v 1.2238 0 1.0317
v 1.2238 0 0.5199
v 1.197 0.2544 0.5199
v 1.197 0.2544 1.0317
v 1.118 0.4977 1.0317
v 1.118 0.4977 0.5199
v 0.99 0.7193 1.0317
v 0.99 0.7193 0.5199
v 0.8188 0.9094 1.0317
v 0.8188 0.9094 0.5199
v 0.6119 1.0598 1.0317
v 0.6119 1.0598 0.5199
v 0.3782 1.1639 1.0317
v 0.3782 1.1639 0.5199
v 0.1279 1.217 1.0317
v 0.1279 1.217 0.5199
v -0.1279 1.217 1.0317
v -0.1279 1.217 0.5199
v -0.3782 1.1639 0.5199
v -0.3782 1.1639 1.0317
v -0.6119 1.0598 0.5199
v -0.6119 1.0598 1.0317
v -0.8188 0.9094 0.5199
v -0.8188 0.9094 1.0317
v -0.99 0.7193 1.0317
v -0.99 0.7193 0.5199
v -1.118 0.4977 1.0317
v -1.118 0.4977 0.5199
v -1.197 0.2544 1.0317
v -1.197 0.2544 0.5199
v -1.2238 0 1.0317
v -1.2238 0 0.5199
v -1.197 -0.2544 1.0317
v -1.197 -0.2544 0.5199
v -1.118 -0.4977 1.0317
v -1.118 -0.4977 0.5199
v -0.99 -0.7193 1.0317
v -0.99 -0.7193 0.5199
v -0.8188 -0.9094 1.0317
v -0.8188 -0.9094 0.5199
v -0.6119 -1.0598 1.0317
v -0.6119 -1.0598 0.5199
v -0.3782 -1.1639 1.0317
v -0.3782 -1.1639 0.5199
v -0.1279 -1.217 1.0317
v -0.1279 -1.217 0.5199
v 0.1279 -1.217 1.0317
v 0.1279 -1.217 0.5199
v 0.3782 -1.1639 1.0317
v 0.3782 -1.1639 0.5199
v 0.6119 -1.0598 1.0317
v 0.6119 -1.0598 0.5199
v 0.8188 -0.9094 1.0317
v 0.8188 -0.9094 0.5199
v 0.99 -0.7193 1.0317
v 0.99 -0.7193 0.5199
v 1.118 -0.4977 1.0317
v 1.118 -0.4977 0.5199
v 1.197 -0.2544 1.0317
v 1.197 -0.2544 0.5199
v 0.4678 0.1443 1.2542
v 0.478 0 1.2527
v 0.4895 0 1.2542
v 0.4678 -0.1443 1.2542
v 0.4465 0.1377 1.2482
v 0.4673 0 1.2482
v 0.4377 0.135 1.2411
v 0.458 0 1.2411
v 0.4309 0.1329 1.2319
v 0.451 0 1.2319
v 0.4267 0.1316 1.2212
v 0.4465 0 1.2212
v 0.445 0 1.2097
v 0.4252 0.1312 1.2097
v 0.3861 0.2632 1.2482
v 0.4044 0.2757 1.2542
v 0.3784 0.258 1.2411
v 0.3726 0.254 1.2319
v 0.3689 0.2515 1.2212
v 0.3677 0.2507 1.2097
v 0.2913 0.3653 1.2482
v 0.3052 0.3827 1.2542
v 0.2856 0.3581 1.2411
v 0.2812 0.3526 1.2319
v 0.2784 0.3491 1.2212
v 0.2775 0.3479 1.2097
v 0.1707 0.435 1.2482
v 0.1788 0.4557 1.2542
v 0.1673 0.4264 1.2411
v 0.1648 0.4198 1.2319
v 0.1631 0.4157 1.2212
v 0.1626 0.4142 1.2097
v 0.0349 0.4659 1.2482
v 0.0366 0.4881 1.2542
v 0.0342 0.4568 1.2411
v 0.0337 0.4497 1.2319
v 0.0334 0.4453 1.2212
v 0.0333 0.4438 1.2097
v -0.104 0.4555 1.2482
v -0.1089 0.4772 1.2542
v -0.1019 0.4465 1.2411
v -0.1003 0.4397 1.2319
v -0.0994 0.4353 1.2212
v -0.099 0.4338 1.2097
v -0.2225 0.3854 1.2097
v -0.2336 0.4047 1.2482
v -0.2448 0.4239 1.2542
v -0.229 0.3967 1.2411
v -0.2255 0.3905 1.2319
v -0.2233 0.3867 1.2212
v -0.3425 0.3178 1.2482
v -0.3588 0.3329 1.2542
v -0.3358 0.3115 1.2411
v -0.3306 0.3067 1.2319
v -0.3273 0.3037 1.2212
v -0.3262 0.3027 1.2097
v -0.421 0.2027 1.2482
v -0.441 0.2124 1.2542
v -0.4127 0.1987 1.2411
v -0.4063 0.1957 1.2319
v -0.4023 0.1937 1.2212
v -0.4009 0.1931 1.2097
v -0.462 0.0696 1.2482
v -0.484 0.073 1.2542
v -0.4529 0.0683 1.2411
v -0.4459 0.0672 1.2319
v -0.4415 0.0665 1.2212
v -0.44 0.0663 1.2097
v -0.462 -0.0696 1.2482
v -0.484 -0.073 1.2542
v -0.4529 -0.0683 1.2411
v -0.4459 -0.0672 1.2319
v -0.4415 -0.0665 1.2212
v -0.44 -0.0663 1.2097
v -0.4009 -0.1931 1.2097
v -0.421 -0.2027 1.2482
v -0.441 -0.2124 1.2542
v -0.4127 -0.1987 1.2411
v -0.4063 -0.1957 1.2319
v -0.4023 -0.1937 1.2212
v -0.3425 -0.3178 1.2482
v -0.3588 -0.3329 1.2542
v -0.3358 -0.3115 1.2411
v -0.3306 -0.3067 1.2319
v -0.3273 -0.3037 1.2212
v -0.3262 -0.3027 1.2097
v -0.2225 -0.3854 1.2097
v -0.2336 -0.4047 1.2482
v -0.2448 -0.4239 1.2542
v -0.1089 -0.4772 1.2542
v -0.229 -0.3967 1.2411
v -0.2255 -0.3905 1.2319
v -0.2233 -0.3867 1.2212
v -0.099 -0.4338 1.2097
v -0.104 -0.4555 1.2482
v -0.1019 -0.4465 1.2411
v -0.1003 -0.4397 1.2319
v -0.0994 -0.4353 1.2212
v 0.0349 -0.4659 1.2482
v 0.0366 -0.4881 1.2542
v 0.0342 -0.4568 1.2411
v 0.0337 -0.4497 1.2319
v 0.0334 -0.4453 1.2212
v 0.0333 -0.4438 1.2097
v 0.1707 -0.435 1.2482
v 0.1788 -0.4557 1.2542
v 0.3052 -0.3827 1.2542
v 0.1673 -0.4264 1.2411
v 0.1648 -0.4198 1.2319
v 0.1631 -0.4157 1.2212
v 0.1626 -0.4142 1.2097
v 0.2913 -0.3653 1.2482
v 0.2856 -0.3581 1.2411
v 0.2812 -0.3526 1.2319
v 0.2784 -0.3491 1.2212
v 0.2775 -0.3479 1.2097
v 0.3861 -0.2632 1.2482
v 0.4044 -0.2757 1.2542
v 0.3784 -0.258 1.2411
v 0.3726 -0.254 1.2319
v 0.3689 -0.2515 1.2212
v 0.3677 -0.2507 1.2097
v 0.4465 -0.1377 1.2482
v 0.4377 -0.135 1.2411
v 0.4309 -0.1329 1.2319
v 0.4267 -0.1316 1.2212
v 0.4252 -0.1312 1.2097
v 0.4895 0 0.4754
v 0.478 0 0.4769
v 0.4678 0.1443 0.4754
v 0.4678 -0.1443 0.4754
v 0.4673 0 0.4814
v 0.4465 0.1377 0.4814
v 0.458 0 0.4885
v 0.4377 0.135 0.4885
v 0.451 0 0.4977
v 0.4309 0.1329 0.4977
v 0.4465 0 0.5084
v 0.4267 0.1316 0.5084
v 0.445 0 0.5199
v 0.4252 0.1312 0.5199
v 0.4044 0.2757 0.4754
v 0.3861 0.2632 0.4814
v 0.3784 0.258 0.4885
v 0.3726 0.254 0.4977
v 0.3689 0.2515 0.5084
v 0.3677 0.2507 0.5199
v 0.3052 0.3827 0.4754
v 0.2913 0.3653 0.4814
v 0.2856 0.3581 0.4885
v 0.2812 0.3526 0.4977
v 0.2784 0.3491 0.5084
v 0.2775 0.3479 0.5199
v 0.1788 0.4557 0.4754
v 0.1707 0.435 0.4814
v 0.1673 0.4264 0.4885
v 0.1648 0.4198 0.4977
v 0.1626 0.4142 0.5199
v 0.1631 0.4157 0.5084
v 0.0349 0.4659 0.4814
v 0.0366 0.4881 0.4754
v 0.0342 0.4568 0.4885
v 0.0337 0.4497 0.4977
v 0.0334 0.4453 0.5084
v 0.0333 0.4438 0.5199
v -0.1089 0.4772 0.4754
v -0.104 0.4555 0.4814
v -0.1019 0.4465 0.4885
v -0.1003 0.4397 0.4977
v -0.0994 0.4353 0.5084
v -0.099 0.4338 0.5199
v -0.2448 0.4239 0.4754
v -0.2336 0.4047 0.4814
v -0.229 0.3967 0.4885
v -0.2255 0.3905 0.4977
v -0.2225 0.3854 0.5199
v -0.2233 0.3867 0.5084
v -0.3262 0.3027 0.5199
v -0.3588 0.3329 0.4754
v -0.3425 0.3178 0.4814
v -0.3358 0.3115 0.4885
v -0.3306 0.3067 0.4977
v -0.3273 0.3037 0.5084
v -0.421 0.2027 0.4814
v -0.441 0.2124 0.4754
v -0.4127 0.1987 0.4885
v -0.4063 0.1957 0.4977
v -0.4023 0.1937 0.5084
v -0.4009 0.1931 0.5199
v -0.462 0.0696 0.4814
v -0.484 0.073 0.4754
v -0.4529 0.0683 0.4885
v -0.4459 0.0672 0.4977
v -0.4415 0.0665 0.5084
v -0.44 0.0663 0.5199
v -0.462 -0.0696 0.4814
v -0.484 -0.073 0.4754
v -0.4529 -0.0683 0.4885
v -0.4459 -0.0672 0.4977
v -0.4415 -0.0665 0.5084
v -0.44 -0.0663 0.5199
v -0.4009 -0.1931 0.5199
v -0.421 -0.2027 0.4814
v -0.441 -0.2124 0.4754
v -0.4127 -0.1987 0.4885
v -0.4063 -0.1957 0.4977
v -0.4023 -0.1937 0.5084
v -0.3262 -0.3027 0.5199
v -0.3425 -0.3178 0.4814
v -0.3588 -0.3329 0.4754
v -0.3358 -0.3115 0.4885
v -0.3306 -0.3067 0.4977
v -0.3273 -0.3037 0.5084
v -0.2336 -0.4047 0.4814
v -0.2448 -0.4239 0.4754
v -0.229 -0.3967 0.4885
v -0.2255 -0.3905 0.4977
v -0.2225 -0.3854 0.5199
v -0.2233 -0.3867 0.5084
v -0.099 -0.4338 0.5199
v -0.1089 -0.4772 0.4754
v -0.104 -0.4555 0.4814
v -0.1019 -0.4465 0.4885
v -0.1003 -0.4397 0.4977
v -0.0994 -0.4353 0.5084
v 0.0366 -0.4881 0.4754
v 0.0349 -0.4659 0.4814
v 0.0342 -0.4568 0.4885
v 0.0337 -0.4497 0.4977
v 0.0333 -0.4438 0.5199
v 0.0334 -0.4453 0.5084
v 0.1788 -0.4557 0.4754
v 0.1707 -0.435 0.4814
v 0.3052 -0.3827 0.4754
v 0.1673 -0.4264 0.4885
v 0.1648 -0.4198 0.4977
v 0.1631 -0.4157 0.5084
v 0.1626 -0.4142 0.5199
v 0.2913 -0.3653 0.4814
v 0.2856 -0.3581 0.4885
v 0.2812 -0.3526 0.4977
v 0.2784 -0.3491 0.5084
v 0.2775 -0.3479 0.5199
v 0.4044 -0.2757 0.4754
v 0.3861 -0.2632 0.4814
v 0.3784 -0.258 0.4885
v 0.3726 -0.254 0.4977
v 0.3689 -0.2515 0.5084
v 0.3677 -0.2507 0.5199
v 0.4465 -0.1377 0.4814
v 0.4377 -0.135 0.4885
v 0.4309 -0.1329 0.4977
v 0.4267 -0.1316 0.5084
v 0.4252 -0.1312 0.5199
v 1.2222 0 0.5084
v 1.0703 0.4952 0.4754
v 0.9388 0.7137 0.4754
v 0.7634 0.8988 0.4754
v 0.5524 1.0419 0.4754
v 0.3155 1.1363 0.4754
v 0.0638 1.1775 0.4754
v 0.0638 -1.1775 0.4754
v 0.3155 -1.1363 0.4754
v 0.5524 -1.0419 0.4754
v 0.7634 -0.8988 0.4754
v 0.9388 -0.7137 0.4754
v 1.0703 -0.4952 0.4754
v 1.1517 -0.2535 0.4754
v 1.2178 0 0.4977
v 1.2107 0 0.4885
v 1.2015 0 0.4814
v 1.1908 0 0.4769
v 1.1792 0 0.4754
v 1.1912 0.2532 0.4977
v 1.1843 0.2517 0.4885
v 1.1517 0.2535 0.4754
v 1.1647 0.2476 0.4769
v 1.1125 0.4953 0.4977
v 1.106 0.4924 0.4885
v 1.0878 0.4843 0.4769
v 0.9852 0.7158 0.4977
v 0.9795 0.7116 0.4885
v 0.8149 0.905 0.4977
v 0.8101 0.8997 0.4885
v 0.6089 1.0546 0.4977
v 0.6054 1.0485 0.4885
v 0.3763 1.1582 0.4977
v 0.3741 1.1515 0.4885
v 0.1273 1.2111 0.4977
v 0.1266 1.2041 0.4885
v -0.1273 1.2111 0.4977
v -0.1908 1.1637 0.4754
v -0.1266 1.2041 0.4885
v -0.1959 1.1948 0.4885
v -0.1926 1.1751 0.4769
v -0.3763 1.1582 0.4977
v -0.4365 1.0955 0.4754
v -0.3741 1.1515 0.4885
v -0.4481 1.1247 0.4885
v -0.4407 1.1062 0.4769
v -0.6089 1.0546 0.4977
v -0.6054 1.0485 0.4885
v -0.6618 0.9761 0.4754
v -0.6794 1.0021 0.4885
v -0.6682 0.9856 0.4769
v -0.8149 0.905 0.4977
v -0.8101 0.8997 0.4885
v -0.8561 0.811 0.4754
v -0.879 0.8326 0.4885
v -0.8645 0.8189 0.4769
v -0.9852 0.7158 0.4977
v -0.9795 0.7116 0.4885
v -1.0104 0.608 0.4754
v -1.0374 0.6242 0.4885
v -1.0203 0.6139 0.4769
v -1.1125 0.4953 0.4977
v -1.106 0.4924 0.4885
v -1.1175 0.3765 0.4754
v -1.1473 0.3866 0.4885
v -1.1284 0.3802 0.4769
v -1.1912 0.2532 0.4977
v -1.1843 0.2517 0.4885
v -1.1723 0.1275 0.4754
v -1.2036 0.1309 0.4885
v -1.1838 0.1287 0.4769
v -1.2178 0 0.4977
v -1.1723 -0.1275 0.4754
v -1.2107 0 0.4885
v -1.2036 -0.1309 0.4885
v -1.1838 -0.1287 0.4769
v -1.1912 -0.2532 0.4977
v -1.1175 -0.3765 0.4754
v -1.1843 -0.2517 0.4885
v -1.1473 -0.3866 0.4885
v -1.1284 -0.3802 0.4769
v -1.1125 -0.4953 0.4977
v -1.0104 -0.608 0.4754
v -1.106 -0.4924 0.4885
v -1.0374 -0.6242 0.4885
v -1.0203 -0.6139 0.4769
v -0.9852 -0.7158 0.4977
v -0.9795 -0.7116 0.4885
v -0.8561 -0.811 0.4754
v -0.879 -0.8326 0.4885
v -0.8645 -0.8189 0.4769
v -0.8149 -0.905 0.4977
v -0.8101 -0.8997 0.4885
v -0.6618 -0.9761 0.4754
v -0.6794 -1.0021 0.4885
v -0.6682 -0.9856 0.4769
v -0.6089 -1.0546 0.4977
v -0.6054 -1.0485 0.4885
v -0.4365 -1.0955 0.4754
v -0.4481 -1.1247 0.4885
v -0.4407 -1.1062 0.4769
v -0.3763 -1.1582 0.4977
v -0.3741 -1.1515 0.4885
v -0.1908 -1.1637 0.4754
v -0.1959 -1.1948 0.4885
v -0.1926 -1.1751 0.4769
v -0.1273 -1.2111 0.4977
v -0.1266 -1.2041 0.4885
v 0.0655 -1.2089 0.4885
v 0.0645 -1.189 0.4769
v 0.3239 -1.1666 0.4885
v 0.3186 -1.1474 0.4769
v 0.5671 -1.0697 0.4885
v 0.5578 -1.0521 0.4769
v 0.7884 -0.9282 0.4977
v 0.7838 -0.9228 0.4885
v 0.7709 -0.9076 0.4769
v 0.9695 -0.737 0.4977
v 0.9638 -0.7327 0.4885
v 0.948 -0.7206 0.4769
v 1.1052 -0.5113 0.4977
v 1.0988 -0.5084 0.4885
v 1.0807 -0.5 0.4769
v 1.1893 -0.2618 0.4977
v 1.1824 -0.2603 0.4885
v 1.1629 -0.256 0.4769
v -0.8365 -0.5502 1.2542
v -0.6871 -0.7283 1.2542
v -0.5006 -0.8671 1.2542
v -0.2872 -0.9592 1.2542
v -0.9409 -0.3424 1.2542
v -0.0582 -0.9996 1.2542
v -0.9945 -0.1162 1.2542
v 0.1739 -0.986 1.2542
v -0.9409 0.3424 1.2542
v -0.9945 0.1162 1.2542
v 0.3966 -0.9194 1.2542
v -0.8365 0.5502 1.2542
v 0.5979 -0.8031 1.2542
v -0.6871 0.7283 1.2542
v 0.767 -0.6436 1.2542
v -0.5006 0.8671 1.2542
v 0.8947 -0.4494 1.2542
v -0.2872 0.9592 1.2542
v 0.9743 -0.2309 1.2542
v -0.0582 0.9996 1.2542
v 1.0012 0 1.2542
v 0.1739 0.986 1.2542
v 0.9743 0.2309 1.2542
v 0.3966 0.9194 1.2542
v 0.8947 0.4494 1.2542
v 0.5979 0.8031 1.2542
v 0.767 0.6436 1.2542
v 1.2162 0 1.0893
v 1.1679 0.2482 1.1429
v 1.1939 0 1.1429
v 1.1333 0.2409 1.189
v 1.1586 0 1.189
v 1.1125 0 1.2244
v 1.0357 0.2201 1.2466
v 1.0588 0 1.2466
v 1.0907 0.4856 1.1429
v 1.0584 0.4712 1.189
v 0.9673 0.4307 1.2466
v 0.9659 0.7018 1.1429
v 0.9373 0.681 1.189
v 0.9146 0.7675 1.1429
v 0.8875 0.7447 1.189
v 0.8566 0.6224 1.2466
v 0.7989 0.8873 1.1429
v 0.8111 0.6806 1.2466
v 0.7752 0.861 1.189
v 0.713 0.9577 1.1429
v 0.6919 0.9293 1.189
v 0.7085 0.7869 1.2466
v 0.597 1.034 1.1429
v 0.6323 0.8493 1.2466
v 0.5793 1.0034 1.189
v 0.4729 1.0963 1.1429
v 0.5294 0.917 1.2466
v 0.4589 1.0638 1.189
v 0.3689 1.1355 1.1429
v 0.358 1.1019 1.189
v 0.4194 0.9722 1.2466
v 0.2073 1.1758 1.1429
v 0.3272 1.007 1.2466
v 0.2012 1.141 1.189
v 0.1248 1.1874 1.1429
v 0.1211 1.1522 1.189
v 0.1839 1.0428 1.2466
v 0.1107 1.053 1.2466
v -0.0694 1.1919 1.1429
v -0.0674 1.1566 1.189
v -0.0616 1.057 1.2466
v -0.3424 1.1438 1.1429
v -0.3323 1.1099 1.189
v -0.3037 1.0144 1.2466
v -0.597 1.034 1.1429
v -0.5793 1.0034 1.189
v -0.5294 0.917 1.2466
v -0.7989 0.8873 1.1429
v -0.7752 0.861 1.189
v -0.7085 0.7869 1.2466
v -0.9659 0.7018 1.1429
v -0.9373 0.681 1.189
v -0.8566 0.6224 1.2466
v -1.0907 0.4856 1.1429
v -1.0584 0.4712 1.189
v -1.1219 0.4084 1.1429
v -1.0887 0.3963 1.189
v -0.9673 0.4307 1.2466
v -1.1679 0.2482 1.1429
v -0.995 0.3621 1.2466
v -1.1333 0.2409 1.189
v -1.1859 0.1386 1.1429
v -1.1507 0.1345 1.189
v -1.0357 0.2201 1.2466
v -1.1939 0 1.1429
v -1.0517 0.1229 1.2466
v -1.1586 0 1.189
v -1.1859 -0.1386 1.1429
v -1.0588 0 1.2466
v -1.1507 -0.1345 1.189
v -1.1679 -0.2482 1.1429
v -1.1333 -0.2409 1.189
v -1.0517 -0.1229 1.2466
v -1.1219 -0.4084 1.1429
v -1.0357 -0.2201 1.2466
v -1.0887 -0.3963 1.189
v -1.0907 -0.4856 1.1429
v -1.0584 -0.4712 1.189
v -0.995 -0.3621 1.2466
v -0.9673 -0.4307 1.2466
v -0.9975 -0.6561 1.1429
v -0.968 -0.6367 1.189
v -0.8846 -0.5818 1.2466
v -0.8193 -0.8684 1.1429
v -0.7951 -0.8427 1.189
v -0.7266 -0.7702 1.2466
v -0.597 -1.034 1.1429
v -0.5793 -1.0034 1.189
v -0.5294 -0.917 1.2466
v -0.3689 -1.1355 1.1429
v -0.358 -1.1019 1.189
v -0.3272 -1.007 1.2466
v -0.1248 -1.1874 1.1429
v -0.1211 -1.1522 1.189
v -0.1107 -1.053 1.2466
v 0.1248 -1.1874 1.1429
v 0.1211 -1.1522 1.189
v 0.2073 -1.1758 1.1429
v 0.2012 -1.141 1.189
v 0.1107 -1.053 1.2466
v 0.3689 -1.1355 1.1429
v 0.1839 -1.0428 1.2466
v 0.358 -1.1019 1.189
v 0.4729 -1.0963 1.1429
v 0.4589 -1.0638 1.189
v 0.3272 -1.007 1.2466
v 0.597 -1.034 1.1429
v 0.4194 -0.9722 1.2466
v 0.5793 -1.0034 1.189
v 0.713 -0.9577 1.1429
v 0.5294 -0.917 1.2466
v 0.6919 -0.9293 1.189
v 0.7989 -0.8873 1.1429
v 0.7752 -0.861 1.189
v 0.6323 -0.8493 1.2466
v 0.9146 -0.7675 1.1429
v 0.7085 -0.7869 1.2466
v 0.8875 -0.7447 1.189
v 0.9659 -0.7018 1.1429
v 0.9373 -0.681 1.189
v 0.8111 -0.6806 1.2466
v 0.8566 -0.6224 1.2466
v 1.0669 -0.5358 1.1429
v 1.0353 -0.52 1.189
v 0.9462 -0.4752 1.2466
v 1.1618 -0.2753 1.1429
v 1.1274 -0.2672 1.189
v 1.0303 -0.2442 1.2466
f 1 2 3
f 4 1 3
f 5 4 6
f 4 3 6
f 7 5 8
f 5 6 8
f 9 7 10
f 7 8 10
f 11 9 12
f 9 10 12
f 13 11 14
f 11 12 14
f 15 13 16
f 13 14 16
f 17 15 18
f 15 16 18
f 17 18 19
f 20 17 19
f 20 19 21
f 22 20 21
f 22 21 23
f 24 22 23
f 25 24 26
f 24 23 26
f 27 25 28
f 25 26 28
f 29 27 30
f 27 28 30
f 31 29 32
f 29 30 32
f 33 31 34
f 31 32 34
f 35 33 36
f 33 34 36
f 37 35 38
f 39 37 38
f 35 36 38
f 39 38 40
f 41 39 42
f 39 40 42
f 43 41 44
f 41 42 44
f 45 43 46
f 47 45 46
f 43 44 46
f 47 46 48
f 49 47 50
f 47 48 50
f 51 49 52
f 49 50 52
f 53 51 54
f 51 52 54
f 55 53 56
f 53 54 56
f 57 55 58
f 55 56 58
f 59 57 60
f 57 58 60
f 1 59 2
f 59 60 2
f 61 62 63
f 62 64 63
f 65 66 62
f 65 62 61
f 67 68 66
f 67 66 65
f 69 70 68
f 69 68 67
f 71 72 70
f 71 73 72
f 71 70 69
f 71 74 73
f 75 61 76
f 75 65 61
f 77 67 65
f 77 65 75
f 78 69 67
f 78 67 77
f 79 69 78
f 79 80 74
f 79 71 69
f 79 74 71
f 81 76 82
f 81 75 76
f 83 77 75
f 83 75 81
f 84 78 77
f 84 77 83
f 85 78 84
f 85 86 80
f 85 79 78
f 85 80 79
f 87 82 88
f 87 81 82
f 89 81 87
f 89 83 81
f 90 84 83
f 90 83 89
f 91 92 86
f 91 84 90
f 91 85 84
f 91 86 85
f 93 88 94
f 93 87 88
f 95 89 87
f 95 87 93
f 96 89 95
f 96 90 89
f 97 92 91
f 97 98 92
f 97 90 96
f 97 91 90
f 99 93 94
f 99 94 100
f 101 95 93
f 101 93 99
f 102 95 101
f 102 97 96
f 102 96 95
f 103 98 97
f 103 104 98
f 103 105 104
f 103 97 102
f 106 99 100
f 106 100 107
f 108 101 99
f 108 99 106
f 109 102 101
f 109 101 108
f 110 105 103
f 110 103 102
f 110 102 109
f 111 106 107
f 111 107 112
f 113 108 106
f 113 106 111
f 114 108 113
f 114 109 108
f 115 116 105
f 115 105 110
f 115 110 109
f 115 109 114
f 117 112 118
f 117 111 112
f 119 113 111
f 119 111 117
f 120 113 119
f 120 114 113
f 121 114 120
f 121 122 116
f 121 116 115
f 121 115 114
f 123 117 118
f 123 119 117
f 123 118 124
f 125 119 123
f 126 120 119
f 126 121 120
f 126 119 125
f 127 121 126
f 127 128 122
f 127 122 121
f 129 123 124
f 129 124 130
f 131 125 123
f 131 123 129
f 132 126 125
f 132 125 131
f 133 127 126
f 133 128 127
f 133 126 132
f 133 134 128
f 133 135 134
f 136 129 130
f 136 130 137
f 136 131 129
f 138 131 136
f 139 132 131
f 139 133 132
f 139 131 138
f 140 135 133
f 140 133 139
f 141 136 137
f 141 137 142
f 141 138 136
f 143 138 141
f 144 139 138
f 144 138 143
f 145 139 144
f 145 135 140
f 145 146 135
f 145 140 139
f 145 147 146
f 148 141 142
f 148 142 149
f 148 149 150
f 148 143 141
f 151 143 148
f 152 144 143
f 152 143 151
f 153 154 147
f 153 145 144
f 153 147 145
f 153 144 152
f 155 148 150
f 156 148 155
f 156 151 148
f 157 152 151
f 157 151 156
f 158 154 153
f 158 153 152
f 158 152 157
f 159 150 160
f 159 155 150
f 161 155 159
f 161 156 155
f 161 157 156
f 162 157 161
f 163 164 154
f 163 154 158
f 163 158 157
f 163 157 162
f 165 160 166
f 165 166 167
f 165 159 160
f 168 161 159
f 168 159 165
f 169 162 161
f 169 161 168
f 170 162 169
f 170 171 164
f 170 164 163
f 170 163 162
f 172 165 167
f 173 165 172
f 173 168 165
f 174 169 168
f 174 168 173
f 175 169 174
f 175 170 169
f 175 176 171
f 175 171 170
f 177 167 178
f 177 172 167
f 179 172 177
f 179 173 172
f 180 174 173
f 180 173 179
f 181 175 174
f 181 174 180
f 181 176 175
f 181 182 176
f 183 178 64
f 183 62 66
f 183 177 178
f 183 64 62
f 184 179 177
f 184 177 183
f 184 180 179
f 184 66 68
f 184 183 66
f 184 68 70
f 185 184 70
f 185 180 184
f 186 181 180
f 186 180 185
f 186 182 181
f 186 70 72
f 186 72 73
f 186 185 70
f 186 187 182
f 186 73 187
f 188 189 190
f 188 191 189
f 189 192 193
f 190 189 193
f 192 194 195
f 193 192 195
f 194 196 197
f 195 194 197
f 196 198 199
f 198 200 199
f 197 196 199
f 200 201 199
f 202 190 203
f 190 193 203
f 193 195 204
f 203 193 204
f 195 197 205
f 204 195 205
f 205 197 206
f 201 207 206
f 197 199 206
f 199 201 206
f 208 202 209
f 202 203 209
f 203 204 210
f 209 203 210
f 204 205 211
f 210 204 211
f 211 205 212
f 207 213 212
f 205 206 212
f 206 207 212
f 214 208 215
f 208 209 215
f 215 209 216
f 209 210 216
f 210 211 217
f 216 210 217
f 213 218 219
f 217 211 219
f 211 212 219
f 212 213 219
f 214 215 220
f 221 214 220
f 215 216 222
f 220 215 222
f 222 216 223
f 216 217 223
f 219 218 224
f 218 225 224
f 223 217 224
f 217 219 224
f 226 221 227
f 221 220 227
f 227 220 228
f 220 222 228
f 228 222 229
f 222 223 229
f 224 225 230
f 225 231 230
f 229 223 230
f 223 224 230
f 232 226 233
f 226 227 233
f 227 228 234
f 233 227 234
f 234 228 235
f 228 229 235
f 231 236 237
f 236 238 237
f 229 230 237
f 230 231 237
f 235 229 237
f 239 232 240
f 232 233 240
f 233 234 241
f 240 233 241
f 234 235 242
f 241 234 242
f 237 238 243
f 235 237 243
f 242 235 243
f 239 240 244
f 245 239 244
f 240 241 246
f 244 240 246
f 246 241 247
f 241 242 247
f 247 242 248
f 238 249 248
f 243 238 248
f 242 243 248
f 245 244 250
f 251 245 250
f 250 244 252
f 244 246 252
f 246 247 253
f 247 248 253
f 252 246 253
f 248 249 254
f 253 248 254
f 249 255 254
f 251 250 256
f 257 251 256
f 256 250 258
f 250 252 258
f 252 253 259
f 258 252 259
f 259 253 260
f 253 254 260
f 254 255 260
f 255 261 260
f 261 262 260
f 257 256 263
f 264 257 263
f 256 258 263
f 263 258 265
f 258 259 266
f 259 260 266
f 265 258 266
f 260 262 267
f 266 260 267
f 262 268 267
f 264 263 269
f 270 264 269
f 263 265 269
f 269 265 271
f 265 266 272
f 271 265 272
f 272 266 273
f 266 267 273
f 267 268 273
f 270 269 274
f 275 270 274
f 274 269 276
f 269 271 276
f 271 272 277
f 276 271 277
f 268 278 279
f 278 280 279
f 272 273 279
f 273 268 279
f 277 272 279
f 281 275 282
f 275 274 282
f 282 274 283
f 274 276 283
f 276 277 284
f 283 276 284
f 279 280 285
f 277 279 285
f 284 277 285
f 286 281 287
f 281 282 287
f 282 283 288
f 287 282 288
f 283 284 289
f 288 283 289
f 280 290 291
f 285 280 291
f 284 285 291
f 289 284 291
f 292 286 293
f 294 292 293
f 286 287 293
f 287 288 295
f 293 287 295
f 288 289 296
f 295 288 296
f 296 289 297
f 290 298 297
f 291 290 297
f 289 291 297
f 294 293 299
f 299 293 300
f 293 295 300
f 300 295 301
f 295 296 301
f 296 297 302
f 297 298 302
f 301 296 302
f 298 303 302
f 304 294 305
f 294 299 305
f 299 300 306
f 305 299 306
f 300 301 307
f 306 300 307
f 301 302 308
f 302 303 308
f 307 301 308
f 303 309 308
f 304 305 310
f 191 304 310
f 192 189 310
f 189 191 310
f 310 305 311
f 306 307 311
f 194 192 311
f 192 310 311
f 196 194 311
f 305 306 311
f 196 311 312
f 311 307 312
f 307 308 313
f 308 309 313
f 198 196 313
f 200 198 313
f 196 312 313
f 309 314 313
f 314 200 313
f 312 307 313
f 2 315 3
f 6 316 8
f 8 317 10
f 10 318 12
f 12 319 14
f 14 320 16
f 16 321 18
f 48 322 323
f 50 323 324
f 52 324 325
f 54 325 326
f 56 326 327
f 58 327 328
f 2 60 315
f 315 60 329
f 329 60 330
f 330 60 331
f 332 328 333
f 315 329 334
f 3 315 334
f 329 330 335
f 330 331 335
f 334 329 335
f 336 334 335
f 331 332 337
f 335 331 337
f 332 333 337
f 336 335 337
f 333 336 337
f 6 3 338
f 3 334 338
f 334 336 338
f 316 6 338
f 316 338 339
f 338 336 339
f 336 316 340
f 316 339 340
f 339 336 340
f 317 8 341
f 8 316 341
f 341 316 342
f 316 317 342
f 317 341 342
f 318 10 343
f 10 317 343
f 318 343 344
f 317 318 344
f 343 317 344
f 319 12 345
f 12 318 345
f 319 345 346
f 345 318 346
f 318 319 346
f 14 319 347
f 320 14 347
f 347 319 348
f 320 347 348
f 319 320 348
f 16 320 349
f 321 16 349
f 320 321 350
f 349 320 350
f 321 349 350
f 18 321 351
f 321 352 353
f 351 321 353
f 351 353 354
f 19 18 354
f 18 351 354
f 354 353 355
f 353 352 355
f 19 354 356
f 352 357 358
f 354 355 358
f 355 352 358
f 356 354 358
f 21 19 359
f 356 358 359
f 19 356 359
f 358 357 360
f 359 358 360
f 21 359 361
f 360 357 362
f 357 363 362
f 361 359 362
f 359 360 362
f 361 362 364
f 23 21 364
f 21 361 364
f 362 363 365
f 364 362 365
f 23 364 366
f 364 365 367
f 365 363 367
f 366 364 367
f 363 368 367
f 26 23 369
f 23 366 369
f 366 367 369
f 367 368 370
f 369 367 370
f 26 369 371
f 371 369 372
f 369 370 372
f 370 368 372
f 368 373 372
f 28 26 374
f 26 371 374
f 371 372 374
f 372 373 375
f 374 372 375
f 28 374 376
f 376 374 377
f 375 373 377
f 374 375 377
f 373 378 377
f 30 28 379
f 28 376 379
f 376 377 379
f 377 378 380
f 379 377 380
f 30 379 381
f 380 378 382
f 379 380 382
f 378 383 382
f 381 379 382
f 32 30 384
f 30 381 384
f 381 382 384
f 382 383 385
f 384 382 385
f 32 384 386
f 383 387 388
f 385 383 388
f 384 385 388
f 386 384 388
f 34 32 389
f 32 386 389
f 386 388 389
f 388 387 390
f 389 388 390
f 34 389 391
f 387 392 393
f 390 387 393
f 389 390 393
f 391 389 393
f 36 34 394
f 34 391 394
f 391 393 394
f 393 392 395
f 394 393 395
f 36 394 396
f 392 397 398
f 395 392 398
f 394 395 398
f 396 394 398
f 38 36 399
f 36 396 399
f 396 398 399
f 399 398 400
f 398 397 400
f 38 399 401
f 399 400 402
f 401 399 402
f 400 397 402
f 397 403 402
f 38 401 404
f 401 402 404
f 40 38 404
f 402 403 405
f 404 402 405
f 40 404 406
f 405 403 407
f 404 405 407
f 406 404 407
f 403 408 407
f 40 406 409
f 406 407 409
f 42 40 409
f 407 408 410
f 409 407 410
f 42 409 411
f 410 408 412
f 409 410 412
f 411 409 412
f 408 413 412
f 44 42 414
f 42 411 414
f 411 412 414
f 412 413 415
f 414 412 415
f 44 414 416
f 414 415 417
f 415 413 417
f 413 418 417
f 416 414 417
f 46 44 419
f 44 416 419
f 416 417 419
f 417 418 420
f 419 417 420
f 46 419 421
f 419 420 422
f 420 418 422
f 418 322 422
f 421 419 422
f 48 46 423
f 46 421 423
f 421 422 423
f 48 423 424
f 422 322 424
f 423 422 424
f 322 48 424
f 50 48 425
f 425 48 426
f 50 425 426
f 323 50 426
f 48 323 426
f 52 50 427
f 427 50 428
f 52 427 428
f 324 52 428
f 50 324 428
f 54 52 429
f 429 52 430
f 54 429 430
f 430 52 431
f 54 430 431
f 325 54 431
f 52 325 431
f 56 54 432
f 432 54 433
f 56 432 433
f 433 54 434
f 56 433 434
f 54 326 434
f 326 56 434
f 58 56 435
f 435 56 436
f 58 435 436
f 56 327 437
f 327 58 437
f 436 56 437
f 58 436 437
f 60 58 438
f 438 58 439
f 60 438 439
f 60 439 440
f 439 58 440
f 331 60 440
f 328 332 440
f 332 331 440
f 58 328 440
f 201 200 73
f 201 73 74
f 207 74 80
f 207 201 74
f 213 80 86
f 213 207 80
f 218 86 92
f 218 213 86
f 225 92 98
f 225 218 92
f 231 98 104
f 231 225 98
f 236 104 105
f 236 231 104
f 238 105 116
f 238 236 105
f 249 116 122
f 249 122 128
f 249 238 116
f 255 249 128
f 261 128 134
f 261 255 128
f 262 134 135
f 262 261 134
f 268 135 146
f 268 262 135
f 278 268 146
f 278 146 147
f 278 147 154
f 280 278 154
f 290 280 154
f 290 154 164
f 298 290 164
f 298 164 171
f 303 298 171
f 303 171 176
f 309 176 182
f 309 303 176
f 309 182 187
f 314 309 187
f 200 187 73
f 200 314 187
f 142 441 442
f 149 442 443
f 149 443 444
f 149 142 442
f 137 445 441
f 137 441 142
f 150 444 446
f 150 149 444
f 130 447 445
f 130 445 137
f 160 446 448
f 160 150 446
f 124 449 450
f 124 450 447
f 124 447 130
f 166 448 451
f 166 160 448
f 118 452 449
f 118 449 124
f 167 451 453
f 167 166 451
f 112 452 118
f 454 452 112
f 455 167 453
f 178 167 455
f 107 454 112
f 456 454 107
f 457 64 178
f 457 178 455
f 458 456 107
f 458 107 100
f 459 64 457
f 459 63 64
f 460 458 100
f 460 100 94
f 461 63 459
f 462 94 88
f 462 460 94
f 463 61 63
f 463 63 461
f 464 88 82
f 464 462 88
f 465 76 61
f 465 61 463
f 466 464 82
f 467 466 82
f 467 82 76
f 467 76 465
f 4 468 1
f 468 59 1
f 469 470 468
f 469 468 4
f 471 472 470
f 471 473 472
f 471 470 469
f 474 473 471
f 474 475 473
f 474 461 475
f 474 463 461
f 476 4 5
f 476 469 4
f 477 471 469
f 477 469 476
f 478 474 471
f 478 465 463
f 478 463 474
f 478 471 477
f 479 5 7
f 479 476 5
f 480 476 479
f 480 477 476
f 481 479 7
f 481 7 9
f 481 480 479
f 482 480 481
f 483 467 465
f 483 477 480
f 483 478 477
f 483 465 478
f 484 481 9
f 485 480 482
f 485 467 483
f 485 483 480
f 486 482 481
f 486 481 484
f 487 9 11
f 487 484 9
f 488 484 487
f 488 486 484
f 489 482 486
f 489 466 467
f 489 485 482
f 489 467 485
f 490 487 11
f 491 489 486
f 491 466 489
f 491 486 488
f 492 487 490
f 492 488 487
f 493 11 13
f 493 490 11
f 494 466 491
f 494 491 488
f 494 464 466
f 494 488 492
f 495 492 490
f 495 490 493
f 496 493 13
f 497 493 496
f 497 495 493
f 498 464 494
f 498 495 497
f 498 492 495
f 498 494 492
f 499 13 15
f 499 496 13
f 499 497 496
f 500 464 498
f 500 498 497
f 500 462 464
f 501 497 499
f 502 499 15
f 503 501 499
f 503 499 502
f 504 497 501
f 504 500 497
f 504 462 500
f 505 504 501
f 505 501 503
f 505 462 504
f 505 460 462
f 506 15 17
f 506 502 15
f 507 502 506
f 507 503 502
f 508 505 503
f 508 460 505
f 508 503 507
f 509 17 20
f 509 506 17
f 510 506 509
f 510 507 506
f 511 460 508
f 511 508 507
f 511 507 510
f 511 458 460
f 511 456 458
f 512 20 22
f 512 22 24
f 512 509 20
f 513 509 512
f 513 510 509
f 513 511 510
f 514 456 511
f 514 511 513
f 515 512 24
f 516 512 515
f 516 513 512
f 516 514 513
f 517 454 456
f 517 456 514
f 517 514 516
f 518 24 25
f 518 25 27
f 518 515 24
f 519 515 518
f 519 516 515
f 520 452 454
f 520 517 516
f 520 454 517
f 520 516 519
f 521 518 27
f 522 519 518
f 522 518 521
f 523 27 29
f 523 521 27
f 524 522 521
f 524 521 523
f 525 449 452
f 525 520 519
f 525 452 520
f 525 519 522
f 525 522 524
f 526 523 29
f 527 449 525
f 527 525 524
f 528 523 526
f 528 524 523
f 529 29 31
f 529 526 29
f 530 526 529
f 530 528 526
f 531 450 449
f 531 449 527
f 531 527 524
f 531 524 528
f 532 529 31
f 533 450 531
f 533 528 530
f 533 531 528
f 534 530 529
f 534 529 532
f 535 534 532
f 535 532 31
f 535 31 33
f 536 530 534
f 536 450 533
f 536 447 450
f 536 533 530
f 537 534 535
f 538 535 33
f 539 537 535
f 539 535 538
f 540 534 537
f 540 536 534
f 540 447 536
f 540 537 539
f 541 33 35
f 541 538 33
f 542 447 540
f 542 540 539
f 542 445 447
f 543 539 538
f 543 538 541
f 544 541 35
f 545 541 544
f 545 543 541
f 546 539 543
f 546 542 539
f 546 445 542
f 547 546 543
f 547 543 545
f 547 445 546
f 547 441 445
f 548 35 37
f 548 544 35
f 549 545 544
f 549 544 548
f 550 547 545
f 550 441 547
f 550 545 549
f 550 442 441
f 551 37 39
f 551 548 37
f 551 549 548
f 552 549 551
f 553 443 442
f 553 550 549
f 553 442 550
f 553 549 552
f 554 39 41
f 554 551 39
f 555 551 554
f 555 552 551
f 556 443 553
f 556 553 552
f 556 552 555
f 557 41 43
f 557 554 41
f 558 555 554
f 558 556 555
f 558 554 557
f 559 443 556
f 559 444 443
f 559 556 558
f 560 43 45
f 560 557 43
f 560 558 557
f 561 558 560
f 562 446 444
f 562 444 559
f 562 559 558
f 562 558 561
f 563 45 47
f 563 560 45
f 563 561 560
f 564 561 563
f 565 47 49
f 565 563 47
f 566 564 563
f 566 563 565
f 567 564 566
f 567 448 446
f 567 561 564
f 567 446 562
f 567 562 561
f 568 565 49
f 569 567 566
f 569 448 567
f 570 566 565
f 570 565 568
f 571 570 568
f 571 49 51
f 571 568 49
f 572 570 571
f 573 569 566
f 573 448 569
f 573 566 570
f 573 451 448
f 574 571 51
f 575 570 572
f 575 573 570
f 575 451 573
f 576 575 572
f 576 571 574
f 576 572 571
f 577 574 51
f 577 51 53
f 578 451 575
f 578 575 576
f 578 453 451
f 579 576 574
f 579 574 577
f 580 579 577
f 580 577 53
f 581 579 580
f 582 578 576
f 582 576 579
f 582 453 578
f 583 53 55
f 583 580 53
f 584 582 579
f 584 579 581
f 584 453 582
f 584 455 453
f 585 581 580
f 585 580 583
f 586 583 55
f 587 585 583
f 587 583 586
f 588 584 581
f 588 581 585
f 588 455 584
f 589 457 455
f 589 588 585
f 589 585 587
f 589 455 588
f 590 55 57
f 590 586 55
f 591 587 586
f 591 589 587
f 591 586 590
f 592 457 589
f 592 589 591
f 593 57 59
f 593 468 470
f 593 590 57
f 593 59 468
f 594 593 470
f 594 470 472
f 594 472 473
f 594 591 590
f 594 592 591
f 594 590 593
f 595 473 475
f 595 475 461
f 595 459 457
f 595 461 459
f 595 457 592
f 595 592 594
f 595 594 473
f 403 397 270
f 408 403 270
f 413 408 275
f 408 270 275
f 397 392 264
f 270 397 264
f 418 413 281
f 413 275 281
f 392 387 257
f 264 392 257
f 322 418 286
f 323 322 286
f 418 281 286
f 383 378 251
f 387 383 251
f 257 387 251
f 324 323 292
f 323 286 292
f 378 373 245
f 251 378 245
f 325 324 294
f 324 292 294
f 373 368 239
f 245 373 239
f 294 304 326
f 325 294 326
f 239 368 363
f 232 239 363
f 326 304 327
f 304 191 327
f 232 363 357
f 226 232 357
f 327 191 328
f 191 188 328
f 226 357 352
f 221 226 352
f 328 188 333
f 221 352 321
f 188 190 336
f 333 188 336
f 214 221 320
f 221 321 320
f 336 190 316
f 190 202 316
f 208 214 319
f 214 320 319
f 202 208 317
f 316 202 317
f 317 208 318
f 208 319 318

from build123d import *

# Parameters (mm, degrees)
SKETCH1_R           = 2.75
SKETCH1_R_2         = 1
EXTRUDE_THIN1_DEPTH = 1.75
FILLET1_R           = 0.5
FILLET2_R           = 0.1
SCALE1_SCALE        = 0.445


with BuildPart() as part:
    # Sketch1 → Extrude-Thin1 (new body)
    with BuildSketch(Plane.XY):
        Circle(SKETCH1_R)
        Circle(SKETCH1_R_2, mode=Mode.SUBTRACT)
    extrude(amount=EXTRUDE_THIN1_DEPTH)

    # Fillet1
    fillet1_edges = [part.edges().sort_by_distance(p)[0] for p in [
        (-2.75, 0, 1.75),
    ]]
    fillet(fillet1_edges, radius=FILLET1_R)

    # Fillet2
    fillet2_edges = [part.edges().sort_by_distance(p)[0] for p in [
        (-2.75, 0, 0),
        (-1, 0, 0),
        (-1, 0, 1.75),
    ]]
    fillet(fillet2_edges, radius=FILLET2_R)


with BuildPart() as part_1:
    # Scale1: scaled about (0, 0, 0.856615471)
    add(part.part.scale(SCALE1_SCALE).moved(Location((0, 0, 0.475421586))))


solid = part_1.part
